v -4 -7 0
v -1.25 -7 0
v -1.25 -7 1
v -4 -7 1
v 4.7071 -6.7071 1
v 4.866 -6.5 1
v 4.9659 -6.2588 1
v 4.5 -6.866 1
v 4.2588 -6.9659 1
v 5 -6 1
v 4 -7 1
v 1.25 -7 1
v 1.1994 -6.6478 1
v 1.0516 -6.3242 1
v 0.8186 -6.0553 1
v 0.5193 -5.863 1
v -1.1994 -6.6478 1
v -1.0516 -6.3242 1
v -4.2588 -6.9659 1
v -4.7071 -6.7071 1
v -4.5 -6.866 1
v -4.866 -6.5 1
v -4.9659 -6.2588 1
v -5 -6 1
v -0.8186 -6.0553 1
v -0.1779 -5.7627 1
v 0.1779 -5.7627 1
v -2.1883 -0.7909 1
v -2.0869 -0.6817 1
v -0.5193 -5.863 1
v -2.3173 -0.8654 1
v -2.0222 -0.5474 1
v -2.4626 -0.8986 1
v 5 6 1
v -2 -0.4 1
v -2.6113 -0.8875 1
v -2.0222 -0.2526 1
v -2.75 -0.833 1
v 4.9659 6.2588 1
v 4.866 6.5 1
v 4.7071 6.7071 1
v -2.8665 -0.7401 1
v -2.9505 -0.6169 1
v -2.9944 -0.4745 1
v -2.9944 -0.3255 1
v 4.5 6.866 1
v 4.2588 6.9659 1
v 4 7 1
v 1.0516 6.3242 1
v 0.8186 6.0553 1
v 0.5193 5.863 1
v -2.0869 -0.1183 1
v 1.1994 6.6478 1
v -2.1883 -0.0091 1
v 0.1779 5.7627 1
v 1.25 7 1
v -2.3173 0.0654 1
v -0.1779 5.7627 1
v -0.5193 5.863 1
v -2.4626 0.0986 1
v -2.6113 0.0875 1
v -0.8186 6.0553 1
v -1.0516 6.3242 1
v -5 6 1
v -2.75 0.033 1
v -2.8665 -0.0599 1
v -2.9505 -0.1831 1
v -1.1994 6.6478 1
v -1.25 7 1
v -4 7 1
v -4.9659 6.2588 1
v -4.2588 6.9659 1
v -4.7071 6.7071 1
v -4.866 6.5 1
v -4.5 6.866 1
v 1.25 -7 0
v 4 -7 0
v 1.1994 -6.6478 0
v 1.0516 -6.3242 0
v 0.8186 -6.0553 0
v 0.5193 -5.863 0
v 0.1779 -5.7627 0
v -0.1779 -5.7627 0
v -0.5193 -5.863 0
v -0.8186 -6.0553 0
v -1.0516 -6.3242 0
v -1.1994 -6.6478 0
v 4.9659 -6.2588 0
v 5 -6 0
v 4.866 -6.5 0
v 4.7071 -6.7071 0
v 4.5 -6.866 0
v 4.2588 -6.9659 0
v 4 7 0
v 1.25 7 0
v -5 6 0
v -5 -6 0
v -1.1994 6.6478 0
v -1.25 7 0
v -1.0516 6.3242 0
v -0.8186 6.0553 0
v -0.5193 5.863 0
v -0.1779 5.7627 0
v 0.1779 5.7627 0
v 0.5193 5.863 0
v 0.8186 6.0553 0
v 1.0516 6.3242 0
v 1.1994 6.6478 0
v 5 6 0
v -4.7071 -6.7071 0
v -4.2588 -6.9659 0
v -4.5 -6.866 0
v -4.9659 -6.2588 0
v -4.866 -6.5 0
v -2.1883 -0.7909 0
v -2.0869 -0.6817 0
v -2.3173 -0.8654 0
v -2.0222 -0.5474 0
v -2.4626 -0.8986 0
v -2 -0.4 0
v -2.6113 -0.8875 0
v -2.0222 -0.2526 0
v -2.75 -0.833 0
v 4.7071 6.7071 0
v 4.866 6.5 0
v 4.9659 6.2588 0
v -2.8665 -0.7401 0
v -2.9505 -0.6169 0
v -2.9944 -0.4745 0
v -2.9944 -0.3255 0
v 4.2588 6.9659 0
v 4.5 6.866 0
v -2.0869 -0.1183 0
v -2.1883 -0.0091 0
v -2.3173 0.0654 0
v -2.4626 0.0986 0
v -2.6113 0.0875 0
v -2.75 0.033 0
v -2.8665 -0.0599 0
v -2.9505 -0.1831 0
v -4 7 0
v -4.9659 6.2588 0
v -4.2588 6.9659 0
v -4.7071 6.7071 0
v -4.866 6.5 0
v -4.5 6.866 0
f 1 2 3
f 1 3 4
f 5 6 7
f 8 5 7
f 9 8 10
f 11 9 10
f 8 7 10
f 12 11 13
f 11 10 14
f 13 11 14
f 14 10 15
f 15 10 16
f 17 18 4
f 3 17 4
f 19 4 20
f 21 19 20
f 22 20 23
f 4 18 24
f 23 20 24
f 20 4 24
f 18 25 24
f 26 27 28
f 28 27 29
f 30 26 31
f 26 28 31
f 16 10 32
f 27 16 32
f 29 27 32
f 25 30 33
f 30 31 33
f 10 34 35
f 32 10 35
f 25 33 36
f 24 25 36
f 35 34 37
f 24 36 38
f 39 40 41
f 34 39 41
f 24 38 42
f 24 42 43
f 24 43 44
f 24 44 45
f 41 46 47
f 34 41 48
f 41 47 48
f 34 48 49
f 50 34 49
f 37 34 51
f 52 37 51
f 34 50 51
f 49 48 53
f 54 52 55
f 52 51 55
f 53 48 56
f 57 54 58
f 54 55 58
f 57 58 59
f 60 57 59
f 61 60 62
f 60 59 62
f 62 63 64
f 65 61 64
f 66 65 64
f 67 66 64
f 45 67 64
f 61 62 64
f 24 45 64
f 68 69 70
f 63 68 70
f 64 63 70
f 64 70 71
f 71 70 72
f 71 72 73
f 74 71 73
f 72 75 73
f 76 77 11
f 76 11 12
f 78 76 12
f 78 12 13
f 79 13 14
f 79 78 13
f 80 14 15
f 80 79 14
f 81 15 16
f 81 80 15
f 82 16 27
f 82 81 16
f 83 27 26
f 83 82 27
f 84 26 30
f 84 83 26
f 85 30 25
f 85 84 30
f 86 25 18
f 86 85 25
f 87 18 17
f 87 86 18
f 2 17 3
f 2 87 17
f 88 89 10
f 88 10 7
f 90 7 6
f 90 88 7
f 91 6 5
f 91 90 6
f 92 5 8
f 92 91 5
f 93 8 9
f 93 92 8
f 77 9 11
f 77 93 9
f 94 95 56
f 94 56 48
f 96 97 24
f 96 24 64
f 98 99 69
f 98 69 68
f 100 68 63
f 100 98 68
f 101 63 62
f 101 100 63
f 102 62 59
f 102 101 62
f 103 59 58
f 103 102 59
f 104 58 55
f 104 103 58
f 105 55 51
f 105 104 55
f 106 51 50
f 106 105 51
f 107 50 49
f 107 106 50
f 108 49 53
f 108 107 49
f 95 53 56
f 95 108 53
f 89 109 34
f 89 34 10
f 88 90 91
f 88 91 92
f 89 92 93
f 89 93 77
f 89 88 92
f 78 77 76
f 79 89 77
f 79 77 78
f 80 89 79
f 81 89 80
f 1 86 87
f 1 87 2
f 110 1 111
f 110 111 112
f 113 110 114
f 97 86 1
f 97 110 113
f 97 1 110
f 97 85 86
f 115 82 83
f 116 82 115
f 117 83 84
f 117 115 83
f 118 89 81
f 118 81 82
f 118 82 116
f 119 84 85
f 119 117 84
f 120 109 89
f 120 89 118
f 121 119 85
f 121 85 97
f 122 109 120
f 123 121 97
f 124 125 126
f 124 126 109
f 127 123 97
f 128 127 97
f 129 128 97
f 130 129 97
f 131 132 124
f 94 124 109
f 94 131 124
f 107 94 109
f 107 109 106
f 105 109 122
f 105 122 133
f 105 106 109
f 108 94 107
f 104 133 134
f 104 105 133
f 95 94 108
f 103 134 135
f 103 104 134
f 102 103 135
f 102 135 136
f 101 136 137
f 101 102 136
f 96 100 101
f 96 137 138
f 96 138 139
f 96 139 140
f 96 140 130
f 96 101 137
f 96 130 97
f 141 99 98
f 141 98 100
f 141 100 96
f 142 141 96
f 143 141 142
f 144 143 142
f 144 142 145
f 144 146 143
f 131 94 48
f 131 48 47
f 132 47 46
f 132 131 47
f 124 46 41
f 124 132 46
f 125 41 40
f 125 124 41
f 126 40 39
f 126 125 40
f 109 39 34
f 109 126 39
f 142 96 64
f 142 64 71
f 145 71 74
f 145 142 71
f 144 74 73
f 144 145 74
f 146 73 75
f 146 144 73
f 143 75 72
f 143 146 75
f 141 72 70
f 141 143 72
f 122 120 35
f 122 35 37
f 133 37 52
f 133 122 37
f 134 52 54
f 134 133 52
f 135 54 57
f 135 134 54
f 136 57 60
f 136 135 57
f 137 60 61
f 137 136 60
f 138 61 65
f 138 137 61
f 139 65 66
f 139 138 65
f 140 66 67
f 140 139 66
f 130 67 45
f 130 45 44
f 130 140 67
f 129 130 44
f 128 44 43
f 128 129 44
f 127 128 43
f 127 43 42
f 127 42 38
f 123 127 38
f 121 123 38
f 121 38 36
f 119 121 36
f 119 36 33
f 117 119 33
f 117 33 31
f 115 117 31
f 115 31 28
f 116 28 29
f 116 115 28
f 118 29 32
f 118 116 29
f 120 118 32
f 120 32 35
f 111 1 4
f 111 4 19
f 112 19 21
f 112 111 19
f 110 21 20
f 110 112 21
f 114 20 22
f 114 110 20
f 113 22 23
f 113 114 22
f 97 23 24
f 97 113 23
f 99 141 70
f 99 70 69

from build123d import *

# Parameters (mm, degrees)
ESQUISSE1_R        = 0.5
BOSS_EXTRU_1_DEPTH = 1


with BuildPart() as part:
    # Esquisse1 → Boss.-Extru.1 (new body)
    with BuildSketch(Plane.XY):
        with BuildLine():
            Line((1.25, 7), (4, 7))
            ThreePointArc((4, 7), (4.707106781, 6.707106781), (5, 6))
            Line((5, 6), (5, -6))
            ThreePointArc((5, -6), (4.707106781, -6.707106781), (4, -7))
            Line((4, -7), (1.25, -7))
            ThreePointArc((1.25, -7), (0, -5.75), (-1.25, -7))
            Line((-1.25, -7), (-4, -7))
            ThreePointArc((-4, -7), (-4.707106781, -6.707106781), (-5, -6))
            Line((-5, -6), (-5, 6))
            ThreePointArc((-5, 6), (-4.707106781, 6.707106781), (-4, 7))
            Line((-4, 7), (-1.25, 7))
            ThreePointArc((-1.25, 7), (0, 5.75), (1.25, 7))
        make_face()
        with Locations((-2.5, -0.4)):
            Circle(ESQUISSE1_R, mode=Mode.SUBTRACT)
    extrude(amount=BOSS_EXTRU_1_DEPTH)


solid = part.part
